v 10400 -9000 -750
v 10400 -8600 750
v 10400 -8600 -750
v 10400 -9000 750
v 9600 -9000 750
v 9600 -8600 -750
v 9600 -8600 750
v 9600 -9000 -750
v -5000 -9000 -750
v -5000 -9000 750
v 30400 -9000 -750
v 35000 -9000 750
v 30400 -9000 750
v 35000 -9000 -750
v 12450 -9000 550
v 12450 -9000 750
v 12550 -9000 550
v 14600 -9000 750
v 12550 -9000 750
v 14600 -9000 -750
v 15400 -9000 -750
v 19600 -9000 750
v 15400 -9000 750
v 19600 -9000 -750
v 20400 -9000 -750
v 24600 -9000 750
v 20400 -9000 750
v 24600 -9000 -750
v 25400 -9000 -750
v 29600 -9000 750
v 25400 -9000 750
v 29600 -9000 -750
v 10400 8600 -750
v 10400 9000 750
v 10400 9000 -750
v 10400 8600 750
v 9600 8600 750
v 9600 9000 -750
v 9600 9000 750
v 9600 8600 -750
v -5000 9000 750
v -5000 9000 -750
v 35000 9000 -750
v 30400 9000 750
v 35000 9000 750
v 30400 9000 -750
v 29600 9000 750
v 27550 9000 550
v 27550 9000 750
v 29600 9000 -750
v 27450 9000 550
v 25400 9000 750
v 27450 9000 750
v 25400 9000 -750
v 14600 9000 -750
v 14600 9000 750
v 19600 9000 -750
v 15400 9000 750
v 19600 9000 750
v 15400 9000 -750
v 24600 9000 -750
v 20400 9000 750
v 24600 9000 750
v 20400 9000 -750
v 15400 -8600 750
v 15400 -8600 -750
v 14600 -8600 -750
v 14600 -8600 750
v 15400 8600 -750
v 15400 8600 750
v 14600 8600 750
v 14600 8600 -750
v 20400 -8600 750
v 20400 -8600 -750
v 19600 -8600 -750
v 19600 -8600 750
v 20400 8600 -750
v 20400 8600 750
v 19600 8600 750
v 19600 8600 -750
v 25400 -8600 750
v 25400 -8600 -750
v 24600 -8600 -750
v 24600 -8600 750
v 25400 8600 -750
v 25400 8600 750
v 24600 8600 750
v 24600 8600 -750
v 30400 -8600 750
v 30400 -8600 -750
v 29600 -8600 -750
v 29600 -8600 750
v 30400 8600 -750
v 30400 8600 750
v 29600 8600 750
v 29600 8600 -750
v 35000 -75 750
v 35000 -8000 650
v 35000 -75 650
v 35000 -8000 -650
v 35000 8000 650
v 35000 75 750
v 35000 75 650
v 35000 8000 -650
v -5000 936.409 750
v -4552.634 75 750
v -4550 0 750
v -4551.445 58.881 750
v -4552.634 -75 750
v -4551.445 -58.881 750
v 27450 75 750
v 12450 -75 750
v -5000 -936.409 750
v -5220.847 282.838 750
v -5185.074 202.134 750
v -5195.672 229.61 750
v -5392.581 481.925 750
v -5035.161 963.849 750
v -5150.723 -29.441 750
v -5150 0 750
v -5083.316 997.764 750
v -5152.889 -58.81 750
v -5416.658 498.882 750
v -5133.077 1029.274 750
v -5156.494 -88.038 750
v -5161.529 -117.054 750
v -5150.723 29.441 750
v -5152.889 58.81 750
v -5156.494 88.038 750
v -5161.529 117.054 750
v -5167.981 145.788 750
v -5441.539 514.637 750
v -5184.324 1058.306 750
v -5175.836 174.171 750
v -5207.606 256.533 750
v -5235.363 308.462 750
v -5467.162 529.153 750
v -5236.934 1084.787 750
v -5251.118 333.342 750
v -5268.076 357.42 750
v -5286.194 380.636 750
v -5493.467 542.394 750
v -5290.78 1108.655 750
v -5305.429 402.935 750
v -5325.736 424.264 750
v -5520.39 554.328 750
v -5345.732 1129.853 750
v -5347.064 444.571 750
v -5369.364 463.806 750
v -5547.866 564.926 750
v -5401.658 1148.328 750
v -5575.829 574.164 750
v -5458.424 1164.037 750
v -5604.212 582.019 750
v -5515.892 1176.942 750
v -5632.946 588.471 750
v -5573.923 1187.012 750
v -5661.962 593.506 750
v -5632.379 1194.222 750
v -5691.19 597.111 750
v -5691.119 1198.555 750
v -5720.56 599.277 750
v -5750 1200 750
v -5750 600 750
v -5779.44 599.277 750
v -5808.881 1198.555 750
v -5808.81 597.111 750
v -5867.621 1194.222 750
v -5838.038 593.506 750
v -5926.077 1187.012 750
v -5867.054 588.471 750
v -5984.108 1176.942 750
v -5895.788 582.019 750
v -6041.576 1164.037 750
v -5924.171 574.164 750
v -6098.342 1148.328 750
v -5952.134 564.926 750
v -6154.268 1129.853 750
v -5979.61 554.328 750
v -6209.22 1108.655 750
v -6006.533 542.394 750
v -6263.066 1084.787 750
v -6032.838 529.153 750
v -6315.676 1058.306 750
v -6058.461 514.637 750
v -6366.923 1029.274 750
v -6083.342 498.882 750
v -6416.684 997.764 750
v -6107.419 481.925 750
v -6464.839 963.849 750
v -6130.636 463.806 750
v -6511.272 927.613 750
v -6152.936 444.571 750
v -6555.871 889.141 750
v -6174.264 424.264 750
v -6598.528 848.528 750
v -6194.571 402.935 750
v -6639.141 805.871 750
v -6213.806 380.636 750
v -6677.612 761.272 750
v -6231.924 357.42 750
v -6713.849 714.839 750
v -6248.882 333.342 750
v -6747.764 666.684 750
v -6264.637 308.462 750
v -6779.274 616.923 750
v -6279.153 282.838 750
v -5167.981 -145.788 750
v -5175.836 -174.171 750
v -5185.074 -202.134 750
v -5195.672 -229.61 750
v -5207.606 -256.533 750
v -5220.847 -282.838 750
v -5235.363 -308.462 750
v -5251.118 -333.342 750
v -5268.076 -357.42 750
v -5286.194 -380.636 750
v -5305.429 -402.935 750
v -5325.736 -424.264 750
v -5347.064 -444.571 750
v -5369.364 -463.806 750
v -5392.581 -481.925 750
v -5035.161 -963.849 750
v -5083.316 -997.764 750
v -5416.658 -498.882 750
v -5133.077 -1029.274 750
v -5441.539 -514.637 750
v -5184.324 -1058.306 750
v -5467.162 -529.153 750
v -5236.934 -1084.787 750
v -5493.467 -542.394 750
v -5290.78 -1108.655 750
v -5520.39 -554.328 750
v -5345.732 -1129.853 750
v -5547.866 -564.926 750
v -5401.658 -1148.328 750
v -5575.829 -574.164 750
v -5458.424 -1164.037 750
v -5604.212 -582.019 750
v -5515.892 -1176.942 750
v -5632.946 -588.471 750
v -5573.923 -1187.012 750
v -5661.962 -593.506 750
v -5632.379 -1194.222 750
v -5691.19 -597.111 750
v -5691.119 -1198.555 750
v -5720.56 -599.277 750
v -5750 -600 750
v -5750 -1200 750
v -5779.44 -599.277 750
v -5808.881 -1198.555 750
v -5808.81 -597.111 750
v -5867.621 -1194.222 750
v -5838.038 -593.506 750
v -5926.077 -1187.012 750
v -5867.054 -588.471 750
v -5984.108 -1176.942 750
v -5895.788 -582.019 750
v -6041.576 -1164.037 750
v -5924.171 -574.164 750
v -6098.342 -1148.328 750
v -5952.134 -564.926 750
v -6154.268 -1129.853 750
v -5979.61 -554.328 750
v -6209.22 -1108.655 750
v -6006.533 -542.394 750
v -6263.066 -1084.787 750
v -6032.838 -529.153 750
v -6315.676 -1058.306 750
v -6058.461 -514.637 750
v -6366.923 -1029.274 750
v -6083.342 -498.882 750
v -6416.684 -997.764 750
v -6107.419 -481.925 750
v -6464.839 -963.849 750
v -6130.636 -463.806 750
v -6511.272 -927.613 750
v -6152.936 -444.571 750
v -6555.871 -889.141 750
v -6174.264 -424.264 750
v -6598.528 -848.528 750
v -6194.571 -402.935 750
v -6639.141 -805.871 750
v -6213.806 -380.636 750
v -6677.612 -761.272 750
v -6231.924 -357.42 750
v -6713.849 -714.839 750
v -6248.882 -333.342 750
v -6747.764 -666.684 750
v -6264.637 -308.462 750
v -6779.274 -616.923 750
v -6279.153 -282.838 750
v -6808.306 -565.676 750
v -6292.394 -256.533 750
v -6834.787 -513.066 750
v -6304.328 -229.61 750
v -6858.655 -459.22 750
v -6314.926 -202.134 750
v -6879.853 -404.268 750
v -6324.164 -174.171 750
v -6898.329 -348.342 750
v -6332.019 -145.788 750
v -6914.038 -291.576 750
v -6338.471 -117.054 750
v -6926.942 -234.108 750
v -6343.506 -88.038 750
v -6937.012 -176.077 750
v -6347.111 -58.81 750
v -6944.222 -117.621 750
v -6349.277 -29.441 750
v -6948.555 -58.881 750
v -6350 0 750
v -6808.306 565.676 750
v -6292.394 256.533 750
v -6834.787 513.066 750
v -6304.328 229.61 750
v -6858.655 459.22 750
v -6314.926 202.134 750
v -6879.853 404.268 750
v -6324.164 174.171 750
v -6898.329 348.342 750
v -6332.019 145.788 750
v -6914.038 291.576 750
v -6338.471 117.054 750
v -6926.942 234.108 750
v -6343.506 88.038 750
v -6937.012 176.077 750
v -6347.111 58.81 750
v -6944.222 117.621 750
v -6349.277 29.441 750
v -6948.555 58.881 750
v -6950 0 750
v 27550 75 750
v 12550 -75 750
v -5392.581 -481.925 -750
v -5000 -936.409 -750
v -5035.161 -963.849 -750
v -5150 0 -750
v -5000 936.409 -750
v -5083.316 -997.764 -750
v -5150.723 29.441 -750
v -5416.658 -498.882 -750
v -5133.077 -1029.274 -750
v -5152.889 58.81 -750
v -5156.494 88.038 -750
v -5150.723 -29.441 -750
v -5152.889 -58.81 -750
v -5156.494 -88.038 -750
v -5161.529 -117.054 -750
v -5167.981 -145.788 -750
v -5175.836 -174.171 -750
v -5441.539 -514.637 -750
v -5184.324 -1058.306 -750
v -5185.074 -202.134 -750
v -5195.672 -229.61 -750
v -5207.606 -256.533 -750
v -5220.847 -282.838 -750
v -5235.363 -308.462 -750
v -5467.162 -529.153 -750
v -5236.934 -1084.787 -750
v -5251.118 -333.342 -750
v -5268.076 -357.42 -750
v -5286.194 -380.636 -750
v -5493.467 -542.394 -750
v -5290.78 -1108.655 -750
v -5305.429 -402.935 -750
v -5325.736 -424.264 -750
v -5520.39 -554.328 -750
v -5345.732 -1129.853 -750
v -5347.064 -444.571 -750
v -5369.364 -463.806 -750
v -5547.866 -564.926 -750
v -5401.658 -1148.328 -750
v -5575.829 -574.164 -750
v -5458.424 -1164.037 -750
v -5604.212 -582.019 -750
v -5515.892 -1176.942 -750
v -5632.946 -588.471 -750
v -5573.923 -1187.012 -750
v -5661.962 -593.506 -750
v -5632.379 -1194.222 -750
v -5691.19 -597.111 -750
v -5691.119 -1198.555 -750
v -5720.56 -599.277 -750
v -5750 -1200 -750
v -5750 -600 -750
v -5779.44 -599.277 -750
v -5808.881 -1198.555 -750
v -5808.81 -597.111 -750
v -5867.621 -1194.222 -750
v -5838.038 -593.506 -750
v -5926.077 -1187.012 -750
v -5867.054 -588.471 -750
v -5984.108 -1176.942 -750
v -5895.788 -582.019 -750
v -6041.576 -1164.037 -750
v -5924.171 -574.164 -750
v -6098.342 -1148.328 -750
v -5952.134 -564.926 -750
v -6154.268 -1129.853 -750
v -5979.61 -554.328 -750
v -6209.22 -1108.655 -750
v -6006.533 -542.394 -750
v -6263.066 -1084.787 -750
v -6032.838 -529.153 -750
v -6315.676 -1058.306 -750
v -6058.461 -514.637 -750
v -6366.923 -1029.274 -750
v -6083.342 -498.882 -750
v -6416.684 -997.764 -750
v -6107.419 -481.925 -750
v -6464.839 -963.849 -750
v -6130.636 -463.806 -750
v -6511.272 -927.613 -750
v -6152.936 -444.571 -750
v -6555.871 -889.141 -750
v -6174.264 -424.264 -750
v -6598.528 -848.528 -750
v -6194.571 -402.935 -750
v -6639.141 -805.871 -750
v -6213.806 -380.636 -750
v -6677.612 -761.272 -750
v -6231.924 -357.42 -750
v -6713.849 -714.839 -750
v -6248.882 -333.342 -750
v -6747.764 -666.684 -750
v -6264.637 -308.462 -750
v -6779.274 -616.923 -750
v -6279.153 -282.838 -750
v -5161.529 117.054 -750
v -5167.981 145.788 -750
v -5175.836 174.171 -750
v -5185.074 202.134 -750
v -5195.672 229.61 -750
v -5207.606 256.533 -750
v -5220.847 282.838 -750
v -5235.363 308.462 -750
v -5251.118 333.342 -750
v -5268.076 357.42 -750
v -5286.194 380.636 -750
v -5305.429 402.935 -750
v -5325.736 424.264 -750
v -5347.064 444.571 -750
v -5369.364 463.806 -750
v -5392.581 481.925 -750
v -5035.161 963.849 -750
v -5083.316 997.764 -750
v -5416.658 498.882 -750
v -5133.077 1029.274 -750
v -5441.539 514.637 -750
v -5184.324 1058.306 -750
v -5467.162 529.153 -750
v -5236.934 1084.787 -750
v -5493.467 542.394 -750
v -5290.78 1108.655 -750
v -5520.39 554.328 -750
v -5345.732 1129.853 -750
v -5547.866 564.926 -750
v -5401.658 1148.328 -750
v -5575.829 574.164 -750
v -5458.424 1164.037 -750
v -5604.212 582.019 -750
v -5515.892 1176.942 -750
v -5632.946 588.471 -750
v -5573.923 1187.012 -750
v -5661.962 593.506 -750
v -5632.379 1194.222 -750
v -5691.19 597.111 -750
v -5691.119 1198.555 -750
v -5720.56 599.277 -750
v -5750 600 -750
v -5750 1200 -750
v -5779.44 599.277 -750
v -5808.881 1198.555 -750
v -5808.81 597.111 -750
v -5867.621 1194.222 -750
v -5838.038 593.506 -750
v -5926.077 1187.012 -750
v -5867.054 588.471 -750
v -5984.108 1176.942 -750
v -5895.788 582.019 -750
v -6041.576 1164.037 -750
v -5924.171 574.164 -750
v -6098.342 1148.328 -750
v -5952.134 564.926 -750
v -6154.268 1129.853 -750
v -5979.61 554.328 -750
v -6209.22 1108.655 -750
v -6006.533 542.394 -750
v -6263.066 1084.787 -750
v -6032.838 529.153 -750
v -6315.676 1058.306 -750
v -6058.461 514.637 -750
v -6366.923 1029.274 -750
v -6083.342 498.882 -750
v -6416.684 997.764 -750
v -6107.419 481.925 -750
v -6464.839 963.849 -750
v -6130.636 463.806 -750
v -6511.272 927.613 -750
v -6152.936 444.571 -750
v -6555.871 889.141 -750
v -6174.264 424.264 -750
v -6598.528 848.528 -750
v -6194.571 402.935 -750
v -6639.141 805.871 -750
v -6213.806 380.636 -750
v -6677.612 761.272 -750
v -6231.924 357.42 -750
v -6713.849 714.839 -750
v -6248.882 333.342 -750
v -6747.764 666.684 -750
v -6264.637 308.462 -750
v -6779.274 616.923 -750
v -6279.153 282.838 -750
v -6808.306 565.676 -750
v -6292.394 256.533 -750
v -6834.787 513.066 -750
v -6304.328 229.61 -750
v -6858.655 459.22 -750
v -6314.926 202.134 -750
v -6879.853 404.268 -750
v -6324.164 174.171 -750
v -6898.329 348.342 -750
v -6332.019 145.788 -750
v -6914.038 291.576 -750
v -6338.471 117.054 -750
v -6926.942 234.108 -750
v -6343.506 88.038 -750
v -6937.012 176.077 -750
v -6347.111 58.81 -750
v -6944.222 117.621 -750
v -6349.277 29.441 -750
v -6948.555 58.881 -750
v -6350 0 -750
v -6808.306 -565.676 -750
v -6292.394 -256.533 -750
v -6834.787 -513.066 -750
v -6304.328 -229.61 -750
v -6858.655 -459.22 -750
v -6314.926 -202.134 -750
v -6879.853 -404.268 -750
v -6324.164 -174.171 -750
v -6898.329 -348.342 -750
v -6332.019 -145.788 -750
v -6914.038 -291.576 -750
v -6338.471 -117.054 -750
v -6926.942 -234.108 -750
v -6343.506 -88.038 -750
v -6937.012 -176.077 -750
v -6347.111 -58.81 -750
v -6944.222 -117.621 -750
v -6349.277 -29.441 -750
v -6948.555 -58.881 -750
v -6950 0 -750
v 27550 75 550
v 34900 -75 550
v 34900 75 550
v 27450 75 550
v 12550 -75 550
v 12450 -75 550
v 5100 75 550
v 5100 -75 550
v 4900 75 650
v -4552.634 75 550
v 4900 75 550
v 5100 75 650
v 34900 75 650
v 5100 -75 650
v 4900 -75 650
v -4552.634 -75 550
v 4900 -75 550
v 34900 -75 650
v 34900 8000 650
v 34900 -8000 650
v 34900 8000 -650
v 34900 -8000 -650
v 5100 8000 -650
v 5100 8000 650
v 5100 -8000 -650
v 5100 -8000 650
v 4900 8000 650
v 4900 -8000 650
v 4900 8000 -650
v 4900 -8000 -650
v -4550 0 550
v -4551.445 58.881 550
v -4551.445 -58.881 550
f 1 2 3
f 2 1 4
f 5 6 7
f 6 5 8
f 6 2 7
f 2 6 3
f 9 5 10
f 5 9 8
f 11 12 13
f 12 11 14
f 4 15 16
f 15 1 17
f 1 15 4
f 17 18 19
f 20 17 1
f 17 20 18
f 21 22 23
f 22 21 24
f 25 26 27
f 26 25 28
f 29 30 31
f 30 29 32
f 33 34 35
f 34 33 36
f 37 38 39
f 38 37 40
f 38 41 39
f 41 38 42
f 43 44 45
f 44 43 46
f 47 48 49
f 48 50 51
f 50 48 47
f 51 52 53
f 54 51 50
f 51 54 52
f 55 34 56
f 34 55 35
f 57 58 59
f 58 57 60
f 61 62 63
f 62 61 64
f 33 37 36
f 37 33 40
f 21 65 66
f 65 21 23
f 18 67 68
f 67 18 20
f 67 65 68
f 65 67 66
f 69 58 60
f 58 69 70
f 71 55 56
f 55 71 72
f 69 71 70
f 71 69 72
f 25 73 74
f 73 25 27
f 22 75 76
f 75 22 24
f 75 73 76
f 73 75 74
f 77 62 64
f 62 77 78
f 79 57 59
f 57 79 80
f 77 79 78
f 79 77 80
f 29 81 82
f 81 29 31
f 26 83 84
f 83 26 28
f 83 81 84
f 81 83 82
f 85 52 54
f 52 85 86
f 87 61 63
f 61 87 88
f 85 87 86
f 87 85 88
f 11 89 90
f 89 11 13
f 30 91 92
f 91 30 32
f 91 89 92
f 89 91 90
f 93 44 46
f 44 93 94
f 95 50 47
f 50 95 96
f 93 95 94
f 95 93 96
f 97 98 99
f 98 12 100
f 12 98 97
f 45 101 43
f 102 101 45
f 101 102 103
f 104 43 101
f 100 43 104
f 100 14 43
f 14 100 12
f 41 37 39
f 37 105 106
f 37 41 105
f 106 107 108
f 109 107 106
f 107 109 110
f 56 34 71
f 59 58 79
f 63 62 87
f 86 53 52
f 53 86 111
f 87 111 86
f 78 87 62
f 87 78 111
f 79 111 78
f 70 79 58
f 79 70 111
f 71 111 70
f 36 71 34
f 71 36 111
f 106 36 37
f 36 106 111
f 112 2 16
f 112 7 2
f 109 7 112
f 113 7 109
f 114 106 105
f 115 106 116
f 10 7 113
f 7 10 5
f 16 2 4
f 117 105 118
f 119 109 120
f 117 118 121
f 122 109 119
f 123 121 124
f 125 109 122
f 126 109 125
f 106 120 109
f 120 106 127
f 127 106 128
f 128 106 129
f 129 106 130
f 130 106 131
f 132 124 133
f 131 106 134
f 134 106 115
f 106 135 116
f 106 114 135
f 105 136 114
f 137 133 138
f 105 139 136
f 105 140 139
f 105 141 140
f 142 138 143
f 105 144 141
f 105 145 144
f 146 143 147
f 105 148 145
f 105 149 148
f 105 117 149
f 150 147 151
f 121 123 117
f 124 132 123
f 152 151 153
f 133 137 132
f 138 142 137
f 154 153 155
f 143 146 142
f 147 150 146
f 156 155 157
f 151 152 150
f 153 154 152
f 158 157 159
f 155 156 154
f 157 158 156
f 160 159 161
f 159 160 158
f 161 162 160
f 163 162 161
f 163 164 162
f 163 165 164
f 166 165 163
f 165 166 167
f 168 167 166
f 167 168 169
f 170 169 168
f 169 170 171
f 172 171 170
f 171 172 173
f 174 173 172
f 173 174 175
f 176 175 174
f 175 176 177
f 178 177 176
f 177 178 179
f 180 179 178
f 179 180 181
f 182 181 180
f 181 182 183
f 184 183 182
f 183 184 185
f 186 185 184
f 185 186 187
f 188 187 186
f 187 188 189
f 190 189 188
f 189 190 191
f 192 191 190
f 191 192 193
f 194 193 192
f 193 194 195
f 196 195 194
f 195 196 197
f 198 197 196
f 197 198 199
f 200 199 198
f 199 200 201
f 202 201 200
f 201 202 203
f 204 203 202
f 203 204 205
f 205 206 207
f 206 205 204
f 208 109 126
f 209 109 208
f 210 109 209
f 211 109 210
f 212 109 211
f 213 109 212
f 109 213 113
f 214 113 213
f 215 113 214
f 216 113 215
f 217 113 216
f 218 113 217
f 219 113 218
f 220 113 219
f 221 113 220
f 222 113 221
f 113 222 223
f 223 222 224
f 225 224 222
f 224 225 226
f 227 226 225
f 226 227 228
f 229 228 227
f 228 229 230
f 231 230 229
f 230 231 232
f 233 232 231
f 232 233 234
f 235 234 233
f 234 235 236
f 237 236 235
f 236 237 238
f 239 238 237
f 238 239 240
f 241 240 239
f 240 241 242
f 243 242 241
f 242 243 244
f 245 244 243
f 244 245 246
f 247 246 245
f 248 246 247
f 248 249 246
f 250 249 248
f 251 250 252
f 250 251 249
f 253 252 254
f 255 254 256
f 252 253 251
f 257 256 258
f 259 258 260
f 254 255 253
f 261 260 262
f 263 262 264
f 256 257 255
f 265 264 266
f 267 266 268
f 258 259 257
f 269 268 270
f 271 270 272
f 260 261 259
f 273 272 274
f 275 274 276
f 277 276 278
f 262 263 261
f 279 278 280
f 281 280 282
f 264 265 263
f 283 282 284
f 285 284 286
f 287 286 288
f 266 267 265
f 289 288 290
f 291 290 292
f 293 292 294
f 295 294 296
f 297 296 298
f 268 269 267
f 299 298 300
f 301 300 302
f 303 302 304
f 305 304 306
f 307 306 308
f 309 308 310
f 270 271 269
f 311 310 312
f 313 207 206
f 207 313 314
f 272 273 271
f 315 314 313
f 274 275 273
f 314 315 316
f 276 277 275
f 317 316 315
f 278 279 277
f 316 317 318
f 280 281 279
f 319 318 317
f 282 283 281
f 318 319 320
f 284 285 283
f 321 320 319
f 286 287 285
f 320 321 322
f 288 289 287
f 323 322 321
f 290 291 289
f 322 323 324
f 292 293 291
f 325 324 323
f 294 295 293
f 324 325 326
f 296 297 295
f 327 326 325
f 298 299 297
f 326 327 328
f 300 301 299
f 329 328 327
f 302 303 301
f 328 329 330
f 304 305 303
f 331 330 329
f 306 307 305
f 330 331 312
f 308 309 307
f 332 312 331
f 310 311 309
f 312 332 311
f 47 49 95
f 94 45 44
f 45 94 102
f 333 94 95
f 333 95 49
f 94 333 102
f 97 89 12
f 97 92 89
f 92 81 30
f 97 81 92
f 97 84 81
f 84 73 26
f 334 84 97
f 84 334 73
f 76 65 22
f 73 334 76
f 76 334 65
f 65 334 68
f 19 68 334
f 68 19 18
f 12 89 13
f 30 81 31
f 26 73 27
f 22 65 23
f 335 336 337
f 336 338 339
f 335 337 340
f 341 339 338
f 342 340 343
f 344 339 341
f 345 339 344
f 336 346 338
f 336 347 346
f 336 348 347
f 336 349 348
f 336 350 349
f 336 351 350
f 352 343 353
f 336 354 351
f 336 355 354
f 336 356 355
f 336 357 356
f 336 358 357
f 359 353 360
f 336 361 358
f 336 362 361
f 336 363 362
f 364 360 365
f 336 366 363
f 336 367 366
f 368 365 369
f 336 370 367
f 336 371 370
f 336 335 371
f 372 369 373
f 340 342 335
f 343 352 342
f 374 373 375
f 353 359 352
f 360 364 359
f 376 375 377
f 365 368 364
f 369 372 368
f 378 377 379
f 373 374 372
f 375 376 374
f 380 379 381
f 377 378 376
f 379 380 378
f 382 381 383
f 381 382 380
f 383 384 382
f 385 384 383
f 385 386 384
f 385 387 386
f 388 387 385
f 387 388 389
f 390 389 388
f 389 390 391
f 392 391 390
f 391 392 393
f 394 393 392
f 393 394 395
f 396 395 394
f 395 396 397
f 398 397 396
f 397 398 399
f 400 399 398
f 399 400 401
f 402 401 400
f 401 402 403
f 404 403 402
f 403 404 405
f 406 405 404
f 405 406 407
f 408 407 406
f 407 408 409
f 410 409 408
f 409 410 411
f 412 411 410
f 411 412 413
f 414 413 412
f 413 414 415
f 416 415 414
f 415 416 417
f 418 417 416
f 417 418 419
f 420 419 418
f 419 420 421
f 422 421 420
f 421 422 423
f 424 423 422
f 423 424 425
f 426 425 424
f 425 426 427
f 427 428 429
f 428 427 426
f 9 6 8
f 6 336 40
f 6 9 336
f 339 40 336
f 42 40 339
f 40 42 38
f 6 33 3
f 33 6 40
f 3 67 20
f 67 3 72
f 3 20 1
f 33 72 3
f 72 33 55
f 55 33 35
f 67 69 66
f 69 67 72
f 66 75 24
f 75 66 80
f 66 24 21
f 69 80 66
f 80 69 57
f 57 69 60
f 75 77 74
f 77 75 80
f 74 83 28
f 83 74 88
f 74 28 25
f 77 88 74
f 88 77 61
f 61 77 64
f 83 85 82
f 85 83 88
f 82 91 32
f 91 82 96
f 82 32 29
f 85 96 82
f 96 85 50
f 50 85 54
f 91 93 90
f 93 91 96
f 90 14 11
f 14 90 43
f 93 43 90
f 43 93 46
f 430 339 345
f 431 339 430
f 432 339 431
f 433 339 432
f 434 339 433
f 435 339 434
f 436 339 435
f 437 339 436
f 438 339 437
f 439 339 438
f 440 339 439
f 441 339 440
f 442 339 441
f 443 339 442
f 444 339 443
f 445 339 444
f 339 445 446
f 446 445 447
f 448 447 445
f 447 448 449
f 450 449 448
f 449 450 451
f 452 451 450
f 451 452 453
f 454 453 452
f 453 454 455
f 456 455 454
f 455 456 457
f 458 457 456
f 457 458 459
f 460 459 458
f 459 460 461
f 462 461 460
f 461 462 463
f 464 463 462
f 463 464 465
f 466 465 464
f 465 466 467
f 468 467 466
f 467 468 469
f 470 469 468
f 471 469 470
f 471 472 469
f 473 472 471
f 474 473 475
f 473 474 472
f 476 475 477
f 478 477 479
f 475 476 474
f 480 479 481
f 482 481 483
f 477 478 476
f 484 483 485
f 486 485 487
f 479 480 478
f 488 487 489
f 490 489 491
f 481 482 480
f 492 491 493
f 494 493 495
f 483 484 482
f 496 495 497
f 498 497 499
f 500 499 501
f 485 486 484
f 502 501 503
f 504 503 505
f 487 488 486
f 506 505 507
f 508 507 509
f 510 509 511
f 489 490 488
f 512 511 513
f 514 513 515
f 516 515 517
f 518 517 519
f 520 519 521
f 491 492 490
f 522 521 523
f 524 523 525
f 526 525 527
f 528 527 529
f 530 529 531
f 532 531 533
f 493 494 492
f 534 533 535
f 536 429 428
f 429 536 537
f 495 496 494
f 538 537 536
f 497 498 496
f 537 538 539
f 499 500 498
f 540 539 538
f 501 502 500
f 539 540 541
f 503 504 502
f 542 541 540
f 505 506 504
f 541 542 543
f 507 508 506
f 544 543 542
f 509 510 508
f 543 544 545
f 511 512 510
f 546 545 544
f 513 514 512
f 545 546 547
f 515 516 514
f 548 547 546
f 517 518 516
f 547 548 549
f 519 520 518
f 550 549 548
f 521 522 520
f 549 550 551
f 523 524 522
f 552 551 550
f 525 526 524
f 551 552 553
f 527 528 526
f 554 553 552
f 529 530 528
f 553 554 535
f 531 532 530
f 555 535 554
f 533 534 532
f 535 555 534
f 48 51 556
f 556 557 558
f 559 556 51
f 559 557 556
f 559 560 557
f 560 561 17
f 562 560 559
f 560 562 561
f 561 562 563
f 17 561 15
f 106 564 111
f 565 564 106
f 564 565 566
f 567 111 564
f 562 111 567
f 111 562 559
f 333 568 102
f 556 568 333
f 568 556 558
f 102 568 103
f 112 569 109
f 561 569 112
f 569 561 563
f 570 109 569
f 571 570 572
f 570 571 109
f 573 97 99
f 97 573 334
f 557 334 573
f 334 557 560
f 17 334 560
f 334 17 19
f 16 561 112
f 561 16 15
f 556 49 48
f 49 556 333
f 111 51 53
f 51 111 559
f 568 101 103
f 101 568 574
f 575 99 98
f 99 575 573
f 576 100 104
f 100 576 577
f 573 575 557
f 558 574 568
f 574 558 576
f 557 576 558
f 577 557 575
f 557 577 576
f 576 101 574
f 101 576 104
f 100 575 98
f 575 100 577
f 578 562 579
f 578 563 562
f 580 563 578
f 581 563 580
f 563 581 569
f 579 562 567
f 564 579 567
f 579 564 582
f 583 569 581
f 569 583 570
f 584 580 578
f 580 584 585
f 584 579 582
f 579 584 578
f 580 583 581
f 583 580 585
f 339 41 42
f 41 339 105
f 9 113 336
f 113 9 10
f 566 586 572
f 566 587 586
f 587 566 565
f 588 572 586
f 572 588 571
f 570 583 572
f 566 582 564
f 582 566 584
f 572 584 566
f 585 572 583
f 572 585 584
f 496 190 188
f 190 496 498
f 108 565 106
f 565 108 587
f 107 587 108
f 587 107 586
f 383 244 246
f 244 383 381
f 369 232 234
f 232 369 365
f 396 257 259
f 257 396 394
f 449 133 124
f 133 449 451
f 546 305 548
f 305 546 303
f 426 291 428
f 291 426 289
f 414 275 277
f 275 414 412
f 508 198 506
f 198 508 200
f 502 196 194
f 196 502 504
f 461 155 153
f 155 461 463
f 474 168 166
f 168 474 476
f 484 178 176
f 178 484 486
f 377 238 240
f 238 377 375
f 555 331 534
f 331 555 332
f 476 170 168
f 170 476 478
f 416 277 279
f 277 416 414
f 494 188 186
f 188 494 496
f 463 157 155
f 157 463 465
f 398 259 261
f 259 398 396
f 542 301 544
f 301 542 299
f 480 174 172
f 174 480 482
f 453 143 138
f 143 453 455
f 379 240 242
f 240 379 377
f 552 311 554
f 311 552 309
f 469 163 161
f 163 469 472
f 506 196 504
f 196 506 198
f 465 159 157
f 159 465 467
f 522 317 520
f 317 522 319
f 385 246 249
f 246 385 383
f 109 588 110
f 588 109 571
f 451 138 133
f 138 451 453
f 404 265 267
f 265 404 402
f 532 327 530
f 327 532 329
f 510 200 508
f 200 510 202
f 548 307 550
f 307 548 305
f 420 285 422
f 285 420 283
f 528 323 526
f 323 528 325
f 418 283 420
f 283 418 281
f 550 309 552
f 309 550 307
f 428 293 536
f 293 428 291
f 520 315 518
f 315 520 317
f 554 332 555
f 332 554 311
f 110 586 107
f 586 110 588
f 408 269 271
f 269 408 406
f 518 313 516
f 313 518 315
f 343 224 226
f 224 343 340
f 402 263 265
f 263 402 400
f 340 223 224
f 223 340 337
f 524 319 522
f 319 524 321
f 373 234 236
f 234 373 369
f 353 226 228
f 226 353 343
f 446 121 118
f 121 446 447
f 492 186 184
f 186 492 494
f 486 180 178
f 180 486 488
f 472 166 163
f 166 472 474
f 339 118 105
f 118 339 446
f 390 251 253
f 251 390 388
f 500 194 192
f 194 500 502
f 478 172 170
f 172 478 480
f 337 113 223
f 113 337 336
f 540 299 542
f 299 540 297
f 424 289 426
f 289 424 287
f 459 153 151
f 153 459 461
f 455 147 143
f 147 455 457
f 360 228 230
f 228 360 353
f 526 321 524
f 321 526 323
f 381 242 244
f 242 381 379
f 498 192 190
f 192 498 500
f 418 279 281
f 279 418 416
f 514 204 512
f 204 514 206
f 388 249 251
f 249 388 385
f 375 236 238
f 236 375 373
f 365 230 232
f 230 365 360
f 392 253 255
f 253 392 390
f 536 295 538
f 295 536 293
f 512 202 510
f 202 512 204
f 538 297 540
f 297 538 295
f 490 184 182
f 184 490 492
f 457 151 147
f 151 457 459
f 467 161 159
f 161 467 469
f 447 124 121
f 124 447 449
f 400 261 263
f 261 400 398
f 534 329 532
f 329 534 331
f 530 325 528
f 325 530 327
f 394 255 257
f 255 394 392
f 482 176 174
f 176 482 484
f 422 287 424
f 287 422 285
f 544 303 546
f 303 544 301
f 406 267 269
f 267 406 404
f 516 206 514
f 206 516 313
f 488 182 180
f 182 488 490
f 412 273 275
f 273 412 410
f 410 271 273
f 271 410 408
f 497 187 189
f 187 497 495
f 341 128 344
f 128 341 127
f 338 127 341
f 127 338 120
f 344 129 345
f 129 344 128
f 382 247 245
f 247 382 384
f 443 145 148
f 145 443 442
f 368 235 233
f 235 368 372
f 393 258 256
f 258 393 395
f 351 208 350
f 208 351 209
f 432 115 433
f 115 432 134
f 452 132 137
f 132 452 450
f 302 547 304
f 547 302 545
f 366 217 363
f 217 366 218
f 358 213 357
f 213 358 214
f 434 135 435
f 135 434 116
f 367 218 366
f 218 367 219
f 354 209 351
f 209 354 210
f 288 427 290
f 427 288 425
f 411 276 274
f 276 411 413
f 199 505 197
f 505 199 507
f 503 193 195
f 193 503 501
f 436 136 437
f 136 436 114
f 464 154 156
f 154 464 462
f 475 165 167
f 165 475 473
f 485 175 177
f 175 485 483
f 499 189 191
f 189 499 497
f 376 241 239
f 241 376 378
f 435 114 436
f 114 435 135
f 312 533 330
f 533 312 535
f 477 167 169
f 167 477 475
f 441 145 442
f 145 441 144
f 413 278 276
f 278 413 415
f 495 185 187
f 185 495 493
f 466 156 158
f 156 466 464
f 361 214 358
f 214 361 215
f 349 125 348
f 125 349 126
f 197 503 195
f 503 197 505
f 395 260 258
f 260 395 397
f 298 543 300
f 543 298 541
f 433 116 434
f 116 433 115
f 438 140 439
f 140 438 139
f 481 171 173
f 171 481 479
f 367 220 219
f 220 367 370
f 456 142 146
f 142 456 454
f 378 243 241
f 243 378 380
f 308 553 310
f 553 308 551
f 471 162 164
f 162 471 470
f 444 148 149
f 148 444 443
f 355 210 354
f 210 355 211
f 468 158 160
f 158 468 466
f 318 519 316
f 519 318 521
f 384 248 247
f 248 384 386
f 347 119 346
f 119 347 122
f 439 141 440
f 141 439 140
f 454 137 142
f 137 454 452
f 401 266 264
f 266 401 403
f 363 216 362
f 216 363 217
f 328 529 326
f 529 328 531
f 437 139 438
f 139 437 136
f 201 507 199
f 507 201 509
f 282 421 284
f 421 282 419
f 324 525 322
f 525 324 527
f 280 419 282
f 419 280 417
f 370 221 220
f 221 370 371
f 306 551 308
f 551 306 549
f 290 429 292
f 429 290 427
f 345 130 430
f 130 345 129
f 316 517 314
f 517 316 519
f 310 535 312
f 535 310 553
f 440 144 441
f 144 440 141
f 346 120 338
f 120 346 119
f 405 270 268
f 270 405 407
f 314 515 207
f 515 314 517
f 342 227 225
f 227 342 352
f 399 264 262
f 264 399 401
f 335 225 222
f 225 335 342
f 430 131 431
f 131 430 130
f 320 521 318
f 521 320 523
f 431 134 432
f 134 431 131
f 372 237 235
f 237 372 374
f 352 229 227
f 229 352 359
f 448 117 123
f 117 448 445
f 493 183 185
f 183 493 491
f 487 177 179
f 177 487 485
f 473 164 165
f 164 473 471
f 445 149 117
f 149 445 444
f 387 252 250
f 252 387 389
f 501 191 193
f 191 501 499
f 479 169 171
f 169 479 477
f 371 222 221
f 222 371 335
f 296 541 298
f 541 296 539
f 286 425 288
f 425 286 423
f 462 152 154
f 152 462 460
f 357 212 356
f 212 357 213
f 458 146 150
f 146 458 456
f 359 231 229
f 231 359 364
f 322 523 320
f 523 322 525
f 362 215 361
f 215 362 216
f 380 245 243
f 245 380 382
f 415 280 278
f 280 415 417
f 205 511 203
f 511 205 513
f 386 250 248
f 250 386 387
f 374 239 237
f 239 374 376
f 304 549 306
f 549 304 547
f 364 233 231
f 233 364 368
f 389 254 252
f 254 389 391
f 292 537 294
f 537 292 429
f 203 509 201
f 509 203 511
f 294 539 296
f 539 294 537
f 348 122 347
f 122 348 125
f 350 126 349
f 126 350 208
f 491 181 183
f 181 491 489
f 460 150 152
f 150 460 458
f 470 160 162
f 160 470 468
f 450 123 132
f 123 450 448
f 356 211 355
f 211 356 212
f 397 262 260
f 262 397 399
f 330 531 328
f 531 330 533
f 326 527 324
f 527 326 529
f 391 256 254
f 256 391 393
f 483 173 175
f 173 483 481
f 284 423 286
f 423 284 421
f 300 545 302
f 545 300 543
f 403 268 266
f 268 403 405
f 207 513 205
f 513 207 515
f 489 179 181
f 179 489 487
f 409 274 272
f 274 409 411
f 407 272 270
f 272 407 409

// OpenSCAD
// =========================================================================
// GRUMMAN-STYLED INFLATABLE CARRIER - COMPLETE STRUCTURAL HARNESS Blueprints
// MANUFACTURER: HUNTINGTON INGALLS / NEWPORT NEWS SHIPBUILDING
// HARDWARE ARCHITECTURE: GRADE 5 TITANIUM SUB-SURFACE CONDUITS & INTERLOCKS
// =========================================================================

module carrier_panel_with_scuppers(length=30000, width=18000, thickness=1500) {
    difference() {
        // Main Titanium Interlocking Slab Core
        cube([length, width, thickness], center=true);
        
        // Internal Solid-State Routing Passageway for 3oz Copper Bus
        translate([0, 0, thickness/2 - 100])
            cube([length + 20, 150, 200], center=true);
            
        // Left Blower Motor Divergent Power Cut
        translate([-length/4, -width/4, thickness/2 - 100])
            cube([100, width/2, 200], center=true);
            
        // Right Bilge Sump Pump Power Cut
        translate([length/4, width/4, thickness/2 - 100])
            cube([100, width/2, 200], center=true);
            
        // Hinge Interface Pocket Cavities for 24K Gold Lattice Inserts
        translate([length/2 - 50, 0, 0]) cube([100, width - 2000, thickness - 200], center=true);
        translate([-length/2 + 50, 0, 0]) cube([100, width - 2000, thickness - 200], center=true);
        
        // Passive One-Way Edge Scupper Slots (Water Displacement Layout)
        for (x_offset = [-length/3 : length/6 : length/3]) {
            translate([x_offset, -width/2 + 200, 0]) cube([800, 400, thickness + 20], center=true);
            translate([x_offset, width/2 - 200, 0]) cube([800, 400, thickness + 20], center=true);
        }
    }
}

module titanium_tow_head_module(length=10000, width=18000, thickness=1500) {
    difference() {
        // Lead Unfolded Interface Node
        cube([length, width, thickness], center=true);
        translate([0, 0, thickness/2 - 100]) cube([length + 20, 150, 200], center=true);
        translate([length/2 - 50, 0, 0]) cube([100, width - 2000, thickness - 200], center=true);
    }
    
    // Reinforced External Tow Eye Loop (For Rope or Cable Rigging)
    translate([-length/2 - 750, 0, 0]) {
        difference() {
            rotate([0, 0, 0]) cylinder(h=1500, r=1200, center=true, $fn=128);
            rotate([0, 0, 0]) cylinder(h=1600, r=600, center=true, $fn=128);
        }
    }
}

// Instantiate full module tree for verification
translate([20000, 0, 0]) carrier_panel_with_scuppers();
titanium_tow_head_module();
